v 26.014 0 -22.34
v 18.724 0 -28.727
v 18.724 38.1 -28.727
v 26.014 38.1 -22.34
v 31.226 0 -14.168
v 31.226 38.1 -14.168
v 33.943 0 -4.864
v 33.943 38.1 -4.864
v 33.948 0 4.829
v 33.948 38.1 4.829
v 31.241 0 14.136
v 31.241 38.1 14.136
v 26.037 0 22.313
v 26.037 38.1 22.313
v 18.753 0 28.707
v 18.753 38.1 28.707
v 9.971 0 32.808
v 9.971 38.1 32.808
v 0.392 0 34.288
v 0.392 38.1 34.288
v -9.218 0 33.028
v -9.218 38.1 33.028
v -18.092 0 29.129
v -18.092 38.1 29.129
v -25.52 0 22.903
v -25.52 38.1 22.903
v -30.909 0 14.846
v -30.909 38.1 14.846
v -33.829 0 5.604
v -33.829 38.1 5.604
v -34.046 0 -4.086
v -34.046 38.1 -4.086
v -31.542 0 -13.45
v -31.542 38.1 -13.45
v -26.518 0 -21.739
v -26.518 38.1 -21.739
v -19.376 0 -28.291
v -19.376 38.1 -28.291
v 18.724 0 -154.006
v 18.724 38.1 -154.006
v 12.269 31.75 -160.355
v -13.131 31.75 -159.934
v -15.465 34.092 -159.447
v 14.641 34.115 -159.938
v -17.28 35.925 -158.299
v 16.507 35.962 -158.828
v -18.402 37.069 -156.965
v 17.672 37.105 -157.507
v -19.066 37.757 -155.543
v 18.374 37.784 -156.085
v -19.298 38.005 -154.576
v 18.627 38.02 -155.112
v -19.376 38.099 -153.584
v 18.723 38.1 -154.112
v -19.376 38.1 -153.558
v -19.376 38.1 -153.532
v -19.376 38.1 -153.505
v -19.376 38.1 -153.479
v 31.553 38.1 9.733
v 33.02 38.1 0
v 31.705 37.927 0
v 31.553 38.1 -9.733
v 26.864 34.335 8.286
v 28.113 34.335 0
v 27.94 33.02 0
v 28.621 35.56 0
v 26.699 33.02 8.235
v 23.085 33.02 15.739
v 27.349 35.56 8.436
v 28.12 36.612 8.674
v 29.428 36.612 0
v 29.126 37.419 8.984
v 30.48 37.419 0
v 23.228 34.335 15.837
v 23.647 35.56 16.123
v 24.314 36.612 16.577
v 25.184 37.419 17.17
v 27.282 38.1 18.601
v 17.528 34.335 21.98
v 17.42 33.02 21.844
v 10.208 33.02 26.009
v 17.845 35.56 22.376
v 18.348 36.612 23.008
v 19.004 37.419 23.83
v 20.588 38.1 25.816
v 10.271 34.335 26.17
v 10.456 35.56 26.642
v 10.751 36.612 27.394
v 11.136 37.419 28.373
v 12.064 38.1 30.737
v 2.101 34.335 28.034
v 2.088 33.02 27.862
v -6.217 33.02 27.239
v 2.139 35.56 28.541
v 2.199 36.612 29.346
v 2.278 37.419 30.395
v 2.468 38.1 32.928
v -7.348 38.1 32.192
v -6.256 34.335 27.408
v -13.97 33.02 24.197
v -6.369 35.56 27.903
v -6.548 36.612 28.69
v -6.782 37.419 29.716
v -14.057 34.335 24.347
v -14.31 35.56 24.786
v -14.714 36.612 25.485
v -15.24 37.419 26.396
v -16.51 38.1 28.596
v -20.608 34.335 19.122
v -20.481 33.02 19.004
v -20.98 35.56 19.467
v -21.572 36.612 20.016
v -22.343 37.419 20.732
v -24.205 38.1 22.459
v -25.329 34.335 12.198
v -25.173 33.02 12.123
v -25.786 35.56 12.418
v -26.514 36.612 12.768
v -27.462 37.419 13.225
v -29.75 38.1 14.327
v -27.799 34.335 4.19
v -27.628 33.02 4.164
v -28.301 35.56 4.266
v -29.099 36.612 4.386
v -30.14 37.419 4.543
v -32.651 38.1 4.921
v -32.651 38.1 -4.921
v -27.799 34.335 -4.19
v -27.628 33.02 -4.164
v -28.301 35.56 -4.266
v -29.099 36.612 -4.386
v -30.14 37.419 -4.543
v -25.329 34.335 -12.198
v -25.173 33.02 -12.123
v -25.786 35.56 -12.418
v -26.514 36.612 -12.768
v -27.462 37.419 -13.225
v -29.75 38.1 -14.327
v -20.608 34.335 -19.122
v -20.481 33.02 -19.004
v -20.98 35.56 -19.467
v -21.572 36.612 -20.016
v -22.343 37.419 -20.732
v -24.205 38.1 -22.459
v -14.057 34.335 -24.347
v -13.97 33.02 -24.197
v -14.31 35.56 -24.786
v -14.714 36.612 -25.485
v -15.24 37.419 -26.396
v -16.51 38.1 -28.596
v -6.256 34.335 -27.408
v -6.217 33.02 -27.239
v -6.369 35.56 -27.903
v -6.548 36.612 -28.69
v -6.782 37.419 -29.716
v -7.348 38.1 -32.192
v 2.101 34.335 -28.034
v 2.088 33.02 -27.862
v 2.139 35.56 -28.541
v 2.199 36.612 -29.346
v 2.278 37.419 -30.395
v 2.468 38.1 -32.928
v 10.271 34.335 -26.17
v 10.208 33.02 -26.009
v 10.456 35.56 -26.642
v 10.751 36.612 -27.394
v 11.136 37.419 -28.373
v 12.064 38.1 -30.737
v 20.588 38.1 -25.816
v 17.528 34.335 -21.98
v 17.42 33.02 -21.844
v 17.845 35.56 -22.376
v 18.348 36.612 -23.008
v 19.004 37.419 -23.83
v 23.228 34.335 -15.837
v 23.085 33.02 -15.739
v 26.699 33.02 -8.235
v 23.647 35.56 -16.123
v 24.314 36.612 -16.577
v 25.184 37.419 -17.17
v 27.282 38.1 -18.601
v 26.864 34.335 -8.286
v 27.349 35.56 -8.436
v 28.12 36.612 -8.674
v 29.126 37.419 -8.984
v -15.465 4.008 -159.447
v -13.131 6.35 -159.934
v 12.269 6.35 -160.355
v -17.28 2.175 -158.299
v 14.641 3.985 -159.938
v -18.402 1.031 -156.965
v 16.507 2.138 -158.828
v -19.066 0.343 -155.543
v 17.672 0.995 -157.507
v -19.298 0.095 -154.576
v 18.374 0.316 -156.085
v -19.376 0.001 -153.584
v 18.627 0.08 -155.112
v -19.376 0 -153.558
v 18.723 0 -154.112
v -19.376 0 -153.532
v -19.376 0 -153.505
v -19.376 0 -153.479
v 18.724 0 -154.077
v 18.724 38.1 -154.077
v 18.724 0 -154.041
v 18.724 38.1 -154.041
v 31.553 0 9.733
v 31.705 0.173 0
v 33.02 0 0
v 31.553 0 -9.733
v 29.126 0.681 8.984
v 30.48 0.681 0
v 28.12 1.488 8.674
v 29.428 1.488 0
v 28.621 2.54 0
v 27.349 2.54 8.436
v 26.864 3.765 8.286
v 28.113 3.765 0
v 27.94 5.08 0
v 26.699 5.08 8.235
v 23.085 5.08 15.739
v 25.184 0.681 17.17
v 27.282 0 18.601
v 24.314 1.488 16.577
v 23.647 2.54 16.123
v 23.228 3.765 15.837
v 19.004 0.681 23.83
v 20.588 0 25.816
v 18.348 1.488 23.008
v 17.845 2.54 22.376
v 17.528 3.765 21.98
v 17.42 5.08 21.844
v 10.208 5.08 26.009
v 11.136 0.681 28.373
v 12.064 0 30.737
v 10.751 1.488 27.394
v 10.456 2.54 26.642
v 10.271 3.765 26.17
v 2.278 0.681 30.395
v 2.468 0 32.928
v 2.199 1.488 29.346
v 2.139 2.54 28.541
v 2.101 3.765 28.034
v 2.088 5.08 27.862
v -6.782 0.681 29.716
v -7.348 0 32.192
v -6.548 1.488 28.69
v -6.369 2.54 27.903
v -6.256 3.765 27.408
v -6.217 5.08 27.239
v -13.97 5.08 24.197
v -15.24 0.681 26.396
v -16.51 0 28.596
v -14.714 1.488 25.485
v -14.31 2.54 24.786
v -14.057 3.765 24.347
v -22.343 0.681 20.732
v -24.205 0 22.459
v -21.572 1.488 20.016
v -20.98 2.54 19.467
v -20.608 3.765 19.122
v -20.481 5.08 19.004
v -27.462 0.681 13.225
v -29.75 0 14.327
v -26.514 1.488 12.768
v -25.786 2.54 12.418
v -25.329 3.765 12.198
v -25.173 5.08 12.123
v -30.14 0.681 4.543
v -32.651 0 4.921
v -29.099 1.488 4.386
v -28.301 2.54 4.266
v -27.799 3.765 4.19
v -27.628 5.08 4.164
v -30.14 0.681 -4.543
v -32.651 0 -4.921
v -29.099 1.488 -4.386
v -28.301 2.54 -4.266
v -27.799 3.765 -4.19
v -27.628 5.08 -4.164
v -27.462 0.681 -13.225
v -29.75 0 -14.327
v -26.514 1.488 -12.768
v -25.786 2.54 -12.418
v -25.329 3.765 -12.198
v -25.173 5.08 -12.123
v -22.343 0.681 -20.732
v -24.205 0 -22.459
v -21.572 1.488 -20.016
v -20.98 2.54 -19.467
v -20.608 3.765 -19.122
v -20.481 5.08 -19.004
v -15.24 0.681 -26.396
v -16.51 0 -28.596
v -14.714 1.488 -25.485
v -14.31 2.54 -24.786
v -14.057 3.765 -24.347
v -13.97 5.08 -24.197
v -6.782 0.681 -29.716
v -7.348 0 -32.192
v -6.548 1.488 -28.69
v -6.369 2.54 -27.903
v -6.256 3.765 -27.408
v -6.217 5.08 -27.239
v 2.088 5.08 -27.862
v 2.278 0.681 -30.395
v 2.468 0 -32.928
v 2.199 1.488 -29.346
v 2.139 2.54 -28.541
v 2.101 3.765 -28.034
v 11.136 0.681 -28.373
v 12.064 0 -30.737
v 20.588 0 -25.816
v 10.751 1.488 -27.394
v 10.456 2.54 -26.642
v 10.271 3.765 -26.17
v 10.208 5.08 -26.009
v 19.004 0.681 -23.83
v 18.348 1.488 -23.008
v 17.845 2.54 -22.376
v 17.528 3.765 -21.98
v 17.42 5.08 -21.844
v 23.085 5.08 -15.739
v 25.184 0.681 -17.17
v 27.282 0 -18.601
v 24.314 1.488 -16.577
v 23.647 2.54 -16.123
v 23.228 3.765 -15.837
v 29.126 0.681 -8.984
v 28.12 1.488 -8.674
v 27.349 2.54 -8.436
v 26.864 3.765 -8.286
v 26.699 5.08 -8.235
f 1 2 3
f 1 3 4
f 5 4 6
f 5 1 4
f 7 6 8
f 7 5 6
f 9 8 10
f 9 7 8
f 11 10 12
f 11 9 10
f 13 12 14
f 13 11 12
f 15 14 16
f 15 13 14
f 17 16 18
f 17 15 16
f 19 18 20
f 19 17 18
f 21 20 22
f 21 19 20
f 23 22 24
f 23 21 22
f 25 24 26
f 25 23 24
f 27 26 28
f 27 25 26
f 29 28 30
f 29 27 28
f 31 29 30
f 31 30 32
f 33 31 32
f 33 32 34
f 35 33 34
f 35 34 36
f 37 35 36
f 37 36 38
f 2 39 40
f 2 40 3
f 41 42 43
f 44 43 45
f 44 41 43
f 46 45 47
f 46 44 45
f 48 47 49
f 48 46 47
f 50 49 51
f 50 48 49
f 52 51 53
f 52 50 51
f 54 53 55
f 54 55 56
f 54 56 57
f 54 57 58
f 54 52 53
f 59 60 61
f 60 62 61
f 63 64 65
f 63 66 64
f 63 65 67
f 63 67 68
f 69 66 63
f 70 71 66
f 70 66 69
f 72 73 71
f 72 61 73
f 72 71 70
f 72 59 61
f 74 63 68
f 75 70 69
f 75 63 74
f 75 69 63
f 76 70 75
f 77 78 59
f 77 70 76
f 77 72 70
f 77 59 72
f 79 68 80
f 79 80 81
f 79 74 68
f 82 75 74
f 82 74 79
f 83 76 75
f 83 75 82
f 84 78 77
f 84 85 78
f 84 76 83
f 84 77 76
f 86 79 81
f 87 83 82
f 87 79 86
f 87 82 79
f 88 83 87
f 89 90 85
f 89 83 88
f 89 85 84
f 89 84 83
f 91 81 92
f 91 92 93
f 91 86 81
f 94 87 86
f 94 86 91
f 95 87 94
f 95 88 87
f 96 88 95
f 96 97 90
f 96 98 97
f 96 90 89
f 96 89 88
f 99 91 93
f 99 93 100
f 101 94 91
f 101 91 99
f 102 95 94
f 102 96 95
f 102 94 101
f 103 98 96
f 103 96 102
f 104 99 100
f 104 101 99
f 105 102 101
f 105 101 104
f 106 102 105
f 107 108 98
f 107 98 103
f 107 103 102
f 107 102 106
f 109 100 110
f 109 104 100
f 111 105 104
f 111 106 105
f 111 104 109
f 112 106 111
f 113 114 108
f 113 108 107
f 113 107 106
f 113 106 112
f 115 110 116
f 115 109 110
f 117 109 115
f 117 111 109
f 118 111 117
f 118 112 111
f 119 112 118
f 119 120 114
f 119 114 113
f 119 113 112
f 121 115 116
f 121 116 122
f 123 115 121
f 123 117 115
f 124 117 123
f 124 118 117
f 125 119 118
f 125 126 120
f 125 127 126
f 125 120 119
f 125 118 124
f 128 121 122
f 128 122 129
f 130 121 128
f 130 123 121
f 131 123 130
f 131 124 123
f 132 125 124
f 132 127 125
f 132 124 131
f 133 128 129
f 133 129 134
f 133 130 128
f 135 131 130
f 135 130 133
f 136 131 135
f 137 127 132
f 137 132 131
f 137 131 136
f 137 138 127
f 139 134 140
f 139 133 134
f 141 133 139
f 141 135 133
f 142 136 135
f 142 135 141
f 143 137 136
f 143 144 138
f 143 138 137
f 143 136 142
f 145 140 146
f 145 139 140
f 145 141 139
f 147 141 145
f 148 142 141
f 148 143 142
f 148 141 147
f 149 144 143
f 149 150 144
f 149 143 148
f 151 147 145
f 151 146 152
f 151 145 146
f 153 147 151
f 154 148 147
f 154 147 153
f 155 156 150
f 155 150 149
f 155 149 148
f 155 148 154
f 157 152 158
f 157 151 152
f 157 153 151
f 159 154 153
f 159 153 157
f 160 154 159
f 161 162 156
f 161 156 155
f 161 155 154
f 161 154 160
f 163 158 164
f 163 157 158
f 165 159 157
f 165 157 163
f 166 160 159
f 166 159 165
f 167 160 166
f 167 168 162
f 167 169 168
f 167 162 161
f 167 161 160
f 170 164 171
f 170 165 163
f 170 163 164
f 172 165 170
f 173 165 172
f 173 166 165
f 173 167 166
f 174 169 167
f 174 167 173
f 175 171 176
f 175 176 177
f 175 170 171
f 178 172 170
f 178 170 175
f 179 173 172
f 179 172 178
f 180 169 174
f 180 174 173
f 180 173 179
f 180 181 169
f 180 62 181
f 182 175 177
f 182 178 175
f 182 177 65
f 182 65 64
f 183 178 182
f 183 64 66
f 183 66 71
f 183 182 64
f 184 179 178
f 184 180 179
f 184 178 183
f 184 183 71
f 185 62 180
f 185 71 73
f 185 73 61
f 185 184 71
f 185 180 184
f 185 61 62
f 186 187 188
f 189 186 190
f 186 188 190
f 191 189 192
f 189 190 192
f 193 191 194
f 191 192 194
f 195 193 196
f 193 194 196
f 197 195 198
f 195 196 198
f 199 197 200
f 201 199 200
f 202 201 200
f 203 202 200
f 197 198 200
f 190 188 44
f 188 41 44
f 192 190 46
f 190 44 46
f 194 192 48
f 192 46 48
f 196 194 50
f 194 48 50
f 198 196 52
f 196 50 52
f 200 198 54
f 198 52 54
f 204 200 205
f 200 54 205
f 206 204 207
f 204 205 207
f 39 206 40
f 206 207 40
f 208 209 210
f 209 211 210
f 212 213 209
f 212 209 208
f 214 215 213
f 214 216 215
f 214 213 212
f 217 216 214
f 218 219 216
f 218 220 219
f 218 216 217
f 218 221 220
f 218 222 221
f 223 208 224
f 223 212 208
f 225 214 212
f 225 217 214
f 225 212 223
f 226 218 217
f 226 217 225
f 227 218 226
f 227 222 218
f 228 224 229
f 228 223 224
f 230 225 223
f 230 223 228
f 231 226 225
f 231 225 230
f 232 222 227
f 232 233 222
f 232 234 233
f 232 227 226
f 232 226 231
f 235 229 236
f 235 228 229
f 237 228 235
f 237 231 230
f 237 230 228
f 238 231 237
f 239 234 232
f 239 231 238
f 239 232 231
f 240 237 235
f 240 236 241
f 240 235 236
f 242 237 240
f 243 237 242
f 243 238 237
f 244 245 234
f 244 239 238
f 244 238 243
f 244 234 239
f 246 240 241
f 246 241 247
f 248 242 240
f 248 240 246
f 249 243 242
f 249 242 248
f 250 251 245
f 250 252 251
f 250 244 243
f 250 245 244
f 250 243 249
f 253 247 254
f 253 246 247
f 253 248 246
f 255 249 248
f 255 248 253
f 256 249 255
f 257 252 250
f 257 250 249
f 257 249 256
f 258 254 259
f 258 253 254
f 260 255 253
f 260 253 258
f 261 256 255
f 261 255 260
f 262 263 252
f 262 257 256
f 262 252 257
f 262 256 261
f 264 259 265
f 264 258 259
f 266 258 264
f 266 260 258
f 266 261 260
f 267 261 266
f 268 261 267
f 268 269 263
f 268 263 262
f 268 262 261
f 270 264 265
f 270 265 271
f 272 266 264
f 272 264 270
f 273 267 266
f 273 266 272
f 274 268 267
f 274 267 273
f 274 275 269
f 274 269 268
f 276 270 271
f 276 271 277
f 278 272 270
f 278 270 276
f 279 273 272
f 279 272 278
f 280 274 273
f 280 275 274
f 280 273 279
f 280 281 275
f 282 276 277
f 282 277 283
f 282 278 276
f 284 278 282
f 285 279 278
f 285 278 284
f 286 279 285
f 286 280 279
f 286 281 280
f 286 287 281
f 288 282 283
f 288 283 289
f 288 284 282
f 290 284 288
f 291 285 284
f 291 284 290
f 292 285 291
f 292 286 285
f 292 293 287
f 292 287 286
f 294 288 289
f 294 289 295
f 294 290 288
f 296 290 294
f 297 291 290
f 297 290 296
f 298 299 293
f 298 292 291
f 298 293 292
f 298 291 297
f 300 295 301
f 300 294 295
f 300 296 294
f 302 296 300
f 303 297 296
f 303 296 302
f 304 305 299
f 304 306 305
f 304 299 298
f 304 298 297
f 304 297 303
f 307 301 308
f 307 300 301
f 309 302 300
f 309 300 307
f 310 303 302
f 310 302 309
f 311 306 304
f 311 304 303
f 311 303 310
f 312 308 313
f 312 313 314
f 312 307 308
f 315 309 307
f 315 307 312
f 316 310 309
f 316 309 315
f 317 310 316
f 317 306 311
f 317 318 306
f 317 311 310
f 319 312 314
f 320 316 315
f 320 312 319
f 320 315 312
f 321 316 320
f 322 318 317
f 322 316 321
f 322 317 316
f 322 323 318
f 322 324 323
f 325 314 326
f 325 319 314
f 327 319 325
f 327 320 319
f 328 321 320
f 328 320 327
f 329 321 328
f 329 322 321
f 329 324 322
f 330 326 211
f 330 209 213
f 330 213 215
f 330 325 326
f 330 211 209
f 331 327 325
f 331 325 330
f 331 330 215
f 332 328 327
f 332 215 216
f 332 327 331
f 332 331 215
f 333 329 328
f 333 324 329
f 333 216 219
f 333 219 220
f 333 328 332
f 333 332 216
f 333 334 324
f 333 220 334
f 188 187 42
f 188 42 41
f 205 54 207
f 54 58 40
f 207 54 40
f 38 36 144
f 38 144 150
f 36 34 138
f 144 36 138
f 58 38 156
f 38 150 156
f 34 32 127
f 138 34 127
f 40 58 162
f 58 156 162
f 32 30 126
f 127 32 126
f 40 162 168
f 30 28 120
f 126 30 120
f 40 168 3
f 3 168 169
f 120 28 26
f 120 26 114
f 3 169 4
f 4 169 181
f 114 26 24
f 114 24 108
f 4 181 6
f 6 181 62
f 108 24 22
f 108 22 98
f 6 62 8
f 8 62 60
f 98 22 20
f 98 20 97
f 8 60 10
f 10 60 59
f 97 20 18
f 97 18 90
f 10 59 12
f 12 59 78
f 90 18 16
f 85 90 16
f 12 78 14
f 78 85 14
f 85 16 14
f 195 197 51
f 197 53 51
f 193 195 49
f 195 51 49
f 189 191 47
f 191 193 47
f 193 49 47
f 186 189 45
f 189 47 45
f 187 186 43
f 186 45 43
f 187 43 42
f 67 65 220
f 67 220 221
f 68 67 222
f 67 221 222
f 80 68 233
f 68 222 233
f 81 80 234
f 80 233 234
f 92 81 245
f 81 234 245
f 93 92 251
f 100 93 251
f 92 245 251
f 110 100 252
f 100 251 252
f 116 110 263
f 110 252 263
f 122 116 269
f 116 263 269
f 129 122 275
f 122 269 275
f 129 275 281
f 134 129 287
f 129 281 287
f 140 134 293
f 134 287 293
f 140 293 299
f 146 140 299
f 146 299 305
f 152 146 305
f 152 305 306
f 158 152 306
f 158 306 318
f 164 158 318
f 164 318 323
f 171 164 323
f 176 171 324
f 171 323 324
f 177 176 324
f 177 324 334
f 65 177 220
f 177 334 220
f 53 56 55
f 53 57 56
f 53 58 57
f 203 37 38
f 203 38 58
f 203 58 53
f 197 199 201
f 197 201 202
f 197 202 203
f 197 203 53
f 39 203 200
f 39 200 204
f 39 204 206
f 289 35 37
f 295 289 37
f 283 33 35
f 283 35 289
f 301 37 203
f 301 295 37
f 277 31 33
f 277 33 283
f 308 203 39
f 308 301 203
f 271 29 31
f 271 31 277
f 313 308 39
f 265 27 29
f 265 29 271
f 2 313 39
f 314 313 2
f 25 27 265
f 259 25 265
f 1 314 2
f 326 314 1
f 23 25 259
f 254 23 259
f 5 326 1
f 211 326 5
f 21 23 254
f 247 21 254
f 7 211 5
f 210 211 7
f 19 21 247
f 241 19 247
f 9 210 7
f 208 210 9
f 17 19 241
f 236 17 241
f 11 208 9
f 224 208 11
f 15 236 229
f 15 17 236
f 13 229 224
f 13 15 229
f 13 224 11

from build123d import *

# Parameters (mm, degrees)
F0_R     = 34.29
F0_R_2   = 27.94
F1_DEPTH = 38.1
F3_DEPTH = 38.1
F4_R     = 6.35
F5_R     = 5.08
F6_R     = 5.08


with BuildPart() as f1:
    # F0 (on Front) → F1 (new body)
    with BuildSketch(Plane.XZ):
        Circle(F0_R)
        Circle(F0_R_2, mode=Mode.SUBTRACT)
    extrude(amount=-F1_DEPTH)

    # F2 (on face) → F3 (join)
    with BuildSketch(Plane.XZ):
        with BuildLine():
            ThreePointArc((18.723981822, -28.7265835896), (-0.3921055503, -34.2877580667), (-19.376018178, -28.2908822691))
            Line((-19.376018178, -28.2908822691), (-19.376018178, -159.8299160348))
            Line((-19.376018178, -159.8299160348), (18.723981822, -160.462572118))
            Line((18.723981822, -160.462572118), (18.723981822, -28.7265835896))
        make_face()
    extrude(amount=-F3_DEPTH)

    # F4
    f4_edges = [f1.edges().sort_by_distance(p)[0] for p in [
        (-0.326018, 0, -160.146244),
        (-0.326018, 38.1, -160.146244),
        (18.723982, 19.05, -160.462572),
        (-19.376018, 19.05, -159.829916),
    ]]
    fillet(f4_edges, radius=F4_R)

    # F5
    f5_edges = [f1.edges().sort_by_distance(p)[0] for p in [
        (-27.94, 0, 0),
    ]]
    fillet(f5_edges, radius=F5_R)

    # F6
    f6_edges = [f1.edges().sort_by_distance(p)[0] for p in [
        (-27.94, 38.1, 0),
    ]]
    fillet(f6_edges, radius=F6_R)


solid = f1.part
